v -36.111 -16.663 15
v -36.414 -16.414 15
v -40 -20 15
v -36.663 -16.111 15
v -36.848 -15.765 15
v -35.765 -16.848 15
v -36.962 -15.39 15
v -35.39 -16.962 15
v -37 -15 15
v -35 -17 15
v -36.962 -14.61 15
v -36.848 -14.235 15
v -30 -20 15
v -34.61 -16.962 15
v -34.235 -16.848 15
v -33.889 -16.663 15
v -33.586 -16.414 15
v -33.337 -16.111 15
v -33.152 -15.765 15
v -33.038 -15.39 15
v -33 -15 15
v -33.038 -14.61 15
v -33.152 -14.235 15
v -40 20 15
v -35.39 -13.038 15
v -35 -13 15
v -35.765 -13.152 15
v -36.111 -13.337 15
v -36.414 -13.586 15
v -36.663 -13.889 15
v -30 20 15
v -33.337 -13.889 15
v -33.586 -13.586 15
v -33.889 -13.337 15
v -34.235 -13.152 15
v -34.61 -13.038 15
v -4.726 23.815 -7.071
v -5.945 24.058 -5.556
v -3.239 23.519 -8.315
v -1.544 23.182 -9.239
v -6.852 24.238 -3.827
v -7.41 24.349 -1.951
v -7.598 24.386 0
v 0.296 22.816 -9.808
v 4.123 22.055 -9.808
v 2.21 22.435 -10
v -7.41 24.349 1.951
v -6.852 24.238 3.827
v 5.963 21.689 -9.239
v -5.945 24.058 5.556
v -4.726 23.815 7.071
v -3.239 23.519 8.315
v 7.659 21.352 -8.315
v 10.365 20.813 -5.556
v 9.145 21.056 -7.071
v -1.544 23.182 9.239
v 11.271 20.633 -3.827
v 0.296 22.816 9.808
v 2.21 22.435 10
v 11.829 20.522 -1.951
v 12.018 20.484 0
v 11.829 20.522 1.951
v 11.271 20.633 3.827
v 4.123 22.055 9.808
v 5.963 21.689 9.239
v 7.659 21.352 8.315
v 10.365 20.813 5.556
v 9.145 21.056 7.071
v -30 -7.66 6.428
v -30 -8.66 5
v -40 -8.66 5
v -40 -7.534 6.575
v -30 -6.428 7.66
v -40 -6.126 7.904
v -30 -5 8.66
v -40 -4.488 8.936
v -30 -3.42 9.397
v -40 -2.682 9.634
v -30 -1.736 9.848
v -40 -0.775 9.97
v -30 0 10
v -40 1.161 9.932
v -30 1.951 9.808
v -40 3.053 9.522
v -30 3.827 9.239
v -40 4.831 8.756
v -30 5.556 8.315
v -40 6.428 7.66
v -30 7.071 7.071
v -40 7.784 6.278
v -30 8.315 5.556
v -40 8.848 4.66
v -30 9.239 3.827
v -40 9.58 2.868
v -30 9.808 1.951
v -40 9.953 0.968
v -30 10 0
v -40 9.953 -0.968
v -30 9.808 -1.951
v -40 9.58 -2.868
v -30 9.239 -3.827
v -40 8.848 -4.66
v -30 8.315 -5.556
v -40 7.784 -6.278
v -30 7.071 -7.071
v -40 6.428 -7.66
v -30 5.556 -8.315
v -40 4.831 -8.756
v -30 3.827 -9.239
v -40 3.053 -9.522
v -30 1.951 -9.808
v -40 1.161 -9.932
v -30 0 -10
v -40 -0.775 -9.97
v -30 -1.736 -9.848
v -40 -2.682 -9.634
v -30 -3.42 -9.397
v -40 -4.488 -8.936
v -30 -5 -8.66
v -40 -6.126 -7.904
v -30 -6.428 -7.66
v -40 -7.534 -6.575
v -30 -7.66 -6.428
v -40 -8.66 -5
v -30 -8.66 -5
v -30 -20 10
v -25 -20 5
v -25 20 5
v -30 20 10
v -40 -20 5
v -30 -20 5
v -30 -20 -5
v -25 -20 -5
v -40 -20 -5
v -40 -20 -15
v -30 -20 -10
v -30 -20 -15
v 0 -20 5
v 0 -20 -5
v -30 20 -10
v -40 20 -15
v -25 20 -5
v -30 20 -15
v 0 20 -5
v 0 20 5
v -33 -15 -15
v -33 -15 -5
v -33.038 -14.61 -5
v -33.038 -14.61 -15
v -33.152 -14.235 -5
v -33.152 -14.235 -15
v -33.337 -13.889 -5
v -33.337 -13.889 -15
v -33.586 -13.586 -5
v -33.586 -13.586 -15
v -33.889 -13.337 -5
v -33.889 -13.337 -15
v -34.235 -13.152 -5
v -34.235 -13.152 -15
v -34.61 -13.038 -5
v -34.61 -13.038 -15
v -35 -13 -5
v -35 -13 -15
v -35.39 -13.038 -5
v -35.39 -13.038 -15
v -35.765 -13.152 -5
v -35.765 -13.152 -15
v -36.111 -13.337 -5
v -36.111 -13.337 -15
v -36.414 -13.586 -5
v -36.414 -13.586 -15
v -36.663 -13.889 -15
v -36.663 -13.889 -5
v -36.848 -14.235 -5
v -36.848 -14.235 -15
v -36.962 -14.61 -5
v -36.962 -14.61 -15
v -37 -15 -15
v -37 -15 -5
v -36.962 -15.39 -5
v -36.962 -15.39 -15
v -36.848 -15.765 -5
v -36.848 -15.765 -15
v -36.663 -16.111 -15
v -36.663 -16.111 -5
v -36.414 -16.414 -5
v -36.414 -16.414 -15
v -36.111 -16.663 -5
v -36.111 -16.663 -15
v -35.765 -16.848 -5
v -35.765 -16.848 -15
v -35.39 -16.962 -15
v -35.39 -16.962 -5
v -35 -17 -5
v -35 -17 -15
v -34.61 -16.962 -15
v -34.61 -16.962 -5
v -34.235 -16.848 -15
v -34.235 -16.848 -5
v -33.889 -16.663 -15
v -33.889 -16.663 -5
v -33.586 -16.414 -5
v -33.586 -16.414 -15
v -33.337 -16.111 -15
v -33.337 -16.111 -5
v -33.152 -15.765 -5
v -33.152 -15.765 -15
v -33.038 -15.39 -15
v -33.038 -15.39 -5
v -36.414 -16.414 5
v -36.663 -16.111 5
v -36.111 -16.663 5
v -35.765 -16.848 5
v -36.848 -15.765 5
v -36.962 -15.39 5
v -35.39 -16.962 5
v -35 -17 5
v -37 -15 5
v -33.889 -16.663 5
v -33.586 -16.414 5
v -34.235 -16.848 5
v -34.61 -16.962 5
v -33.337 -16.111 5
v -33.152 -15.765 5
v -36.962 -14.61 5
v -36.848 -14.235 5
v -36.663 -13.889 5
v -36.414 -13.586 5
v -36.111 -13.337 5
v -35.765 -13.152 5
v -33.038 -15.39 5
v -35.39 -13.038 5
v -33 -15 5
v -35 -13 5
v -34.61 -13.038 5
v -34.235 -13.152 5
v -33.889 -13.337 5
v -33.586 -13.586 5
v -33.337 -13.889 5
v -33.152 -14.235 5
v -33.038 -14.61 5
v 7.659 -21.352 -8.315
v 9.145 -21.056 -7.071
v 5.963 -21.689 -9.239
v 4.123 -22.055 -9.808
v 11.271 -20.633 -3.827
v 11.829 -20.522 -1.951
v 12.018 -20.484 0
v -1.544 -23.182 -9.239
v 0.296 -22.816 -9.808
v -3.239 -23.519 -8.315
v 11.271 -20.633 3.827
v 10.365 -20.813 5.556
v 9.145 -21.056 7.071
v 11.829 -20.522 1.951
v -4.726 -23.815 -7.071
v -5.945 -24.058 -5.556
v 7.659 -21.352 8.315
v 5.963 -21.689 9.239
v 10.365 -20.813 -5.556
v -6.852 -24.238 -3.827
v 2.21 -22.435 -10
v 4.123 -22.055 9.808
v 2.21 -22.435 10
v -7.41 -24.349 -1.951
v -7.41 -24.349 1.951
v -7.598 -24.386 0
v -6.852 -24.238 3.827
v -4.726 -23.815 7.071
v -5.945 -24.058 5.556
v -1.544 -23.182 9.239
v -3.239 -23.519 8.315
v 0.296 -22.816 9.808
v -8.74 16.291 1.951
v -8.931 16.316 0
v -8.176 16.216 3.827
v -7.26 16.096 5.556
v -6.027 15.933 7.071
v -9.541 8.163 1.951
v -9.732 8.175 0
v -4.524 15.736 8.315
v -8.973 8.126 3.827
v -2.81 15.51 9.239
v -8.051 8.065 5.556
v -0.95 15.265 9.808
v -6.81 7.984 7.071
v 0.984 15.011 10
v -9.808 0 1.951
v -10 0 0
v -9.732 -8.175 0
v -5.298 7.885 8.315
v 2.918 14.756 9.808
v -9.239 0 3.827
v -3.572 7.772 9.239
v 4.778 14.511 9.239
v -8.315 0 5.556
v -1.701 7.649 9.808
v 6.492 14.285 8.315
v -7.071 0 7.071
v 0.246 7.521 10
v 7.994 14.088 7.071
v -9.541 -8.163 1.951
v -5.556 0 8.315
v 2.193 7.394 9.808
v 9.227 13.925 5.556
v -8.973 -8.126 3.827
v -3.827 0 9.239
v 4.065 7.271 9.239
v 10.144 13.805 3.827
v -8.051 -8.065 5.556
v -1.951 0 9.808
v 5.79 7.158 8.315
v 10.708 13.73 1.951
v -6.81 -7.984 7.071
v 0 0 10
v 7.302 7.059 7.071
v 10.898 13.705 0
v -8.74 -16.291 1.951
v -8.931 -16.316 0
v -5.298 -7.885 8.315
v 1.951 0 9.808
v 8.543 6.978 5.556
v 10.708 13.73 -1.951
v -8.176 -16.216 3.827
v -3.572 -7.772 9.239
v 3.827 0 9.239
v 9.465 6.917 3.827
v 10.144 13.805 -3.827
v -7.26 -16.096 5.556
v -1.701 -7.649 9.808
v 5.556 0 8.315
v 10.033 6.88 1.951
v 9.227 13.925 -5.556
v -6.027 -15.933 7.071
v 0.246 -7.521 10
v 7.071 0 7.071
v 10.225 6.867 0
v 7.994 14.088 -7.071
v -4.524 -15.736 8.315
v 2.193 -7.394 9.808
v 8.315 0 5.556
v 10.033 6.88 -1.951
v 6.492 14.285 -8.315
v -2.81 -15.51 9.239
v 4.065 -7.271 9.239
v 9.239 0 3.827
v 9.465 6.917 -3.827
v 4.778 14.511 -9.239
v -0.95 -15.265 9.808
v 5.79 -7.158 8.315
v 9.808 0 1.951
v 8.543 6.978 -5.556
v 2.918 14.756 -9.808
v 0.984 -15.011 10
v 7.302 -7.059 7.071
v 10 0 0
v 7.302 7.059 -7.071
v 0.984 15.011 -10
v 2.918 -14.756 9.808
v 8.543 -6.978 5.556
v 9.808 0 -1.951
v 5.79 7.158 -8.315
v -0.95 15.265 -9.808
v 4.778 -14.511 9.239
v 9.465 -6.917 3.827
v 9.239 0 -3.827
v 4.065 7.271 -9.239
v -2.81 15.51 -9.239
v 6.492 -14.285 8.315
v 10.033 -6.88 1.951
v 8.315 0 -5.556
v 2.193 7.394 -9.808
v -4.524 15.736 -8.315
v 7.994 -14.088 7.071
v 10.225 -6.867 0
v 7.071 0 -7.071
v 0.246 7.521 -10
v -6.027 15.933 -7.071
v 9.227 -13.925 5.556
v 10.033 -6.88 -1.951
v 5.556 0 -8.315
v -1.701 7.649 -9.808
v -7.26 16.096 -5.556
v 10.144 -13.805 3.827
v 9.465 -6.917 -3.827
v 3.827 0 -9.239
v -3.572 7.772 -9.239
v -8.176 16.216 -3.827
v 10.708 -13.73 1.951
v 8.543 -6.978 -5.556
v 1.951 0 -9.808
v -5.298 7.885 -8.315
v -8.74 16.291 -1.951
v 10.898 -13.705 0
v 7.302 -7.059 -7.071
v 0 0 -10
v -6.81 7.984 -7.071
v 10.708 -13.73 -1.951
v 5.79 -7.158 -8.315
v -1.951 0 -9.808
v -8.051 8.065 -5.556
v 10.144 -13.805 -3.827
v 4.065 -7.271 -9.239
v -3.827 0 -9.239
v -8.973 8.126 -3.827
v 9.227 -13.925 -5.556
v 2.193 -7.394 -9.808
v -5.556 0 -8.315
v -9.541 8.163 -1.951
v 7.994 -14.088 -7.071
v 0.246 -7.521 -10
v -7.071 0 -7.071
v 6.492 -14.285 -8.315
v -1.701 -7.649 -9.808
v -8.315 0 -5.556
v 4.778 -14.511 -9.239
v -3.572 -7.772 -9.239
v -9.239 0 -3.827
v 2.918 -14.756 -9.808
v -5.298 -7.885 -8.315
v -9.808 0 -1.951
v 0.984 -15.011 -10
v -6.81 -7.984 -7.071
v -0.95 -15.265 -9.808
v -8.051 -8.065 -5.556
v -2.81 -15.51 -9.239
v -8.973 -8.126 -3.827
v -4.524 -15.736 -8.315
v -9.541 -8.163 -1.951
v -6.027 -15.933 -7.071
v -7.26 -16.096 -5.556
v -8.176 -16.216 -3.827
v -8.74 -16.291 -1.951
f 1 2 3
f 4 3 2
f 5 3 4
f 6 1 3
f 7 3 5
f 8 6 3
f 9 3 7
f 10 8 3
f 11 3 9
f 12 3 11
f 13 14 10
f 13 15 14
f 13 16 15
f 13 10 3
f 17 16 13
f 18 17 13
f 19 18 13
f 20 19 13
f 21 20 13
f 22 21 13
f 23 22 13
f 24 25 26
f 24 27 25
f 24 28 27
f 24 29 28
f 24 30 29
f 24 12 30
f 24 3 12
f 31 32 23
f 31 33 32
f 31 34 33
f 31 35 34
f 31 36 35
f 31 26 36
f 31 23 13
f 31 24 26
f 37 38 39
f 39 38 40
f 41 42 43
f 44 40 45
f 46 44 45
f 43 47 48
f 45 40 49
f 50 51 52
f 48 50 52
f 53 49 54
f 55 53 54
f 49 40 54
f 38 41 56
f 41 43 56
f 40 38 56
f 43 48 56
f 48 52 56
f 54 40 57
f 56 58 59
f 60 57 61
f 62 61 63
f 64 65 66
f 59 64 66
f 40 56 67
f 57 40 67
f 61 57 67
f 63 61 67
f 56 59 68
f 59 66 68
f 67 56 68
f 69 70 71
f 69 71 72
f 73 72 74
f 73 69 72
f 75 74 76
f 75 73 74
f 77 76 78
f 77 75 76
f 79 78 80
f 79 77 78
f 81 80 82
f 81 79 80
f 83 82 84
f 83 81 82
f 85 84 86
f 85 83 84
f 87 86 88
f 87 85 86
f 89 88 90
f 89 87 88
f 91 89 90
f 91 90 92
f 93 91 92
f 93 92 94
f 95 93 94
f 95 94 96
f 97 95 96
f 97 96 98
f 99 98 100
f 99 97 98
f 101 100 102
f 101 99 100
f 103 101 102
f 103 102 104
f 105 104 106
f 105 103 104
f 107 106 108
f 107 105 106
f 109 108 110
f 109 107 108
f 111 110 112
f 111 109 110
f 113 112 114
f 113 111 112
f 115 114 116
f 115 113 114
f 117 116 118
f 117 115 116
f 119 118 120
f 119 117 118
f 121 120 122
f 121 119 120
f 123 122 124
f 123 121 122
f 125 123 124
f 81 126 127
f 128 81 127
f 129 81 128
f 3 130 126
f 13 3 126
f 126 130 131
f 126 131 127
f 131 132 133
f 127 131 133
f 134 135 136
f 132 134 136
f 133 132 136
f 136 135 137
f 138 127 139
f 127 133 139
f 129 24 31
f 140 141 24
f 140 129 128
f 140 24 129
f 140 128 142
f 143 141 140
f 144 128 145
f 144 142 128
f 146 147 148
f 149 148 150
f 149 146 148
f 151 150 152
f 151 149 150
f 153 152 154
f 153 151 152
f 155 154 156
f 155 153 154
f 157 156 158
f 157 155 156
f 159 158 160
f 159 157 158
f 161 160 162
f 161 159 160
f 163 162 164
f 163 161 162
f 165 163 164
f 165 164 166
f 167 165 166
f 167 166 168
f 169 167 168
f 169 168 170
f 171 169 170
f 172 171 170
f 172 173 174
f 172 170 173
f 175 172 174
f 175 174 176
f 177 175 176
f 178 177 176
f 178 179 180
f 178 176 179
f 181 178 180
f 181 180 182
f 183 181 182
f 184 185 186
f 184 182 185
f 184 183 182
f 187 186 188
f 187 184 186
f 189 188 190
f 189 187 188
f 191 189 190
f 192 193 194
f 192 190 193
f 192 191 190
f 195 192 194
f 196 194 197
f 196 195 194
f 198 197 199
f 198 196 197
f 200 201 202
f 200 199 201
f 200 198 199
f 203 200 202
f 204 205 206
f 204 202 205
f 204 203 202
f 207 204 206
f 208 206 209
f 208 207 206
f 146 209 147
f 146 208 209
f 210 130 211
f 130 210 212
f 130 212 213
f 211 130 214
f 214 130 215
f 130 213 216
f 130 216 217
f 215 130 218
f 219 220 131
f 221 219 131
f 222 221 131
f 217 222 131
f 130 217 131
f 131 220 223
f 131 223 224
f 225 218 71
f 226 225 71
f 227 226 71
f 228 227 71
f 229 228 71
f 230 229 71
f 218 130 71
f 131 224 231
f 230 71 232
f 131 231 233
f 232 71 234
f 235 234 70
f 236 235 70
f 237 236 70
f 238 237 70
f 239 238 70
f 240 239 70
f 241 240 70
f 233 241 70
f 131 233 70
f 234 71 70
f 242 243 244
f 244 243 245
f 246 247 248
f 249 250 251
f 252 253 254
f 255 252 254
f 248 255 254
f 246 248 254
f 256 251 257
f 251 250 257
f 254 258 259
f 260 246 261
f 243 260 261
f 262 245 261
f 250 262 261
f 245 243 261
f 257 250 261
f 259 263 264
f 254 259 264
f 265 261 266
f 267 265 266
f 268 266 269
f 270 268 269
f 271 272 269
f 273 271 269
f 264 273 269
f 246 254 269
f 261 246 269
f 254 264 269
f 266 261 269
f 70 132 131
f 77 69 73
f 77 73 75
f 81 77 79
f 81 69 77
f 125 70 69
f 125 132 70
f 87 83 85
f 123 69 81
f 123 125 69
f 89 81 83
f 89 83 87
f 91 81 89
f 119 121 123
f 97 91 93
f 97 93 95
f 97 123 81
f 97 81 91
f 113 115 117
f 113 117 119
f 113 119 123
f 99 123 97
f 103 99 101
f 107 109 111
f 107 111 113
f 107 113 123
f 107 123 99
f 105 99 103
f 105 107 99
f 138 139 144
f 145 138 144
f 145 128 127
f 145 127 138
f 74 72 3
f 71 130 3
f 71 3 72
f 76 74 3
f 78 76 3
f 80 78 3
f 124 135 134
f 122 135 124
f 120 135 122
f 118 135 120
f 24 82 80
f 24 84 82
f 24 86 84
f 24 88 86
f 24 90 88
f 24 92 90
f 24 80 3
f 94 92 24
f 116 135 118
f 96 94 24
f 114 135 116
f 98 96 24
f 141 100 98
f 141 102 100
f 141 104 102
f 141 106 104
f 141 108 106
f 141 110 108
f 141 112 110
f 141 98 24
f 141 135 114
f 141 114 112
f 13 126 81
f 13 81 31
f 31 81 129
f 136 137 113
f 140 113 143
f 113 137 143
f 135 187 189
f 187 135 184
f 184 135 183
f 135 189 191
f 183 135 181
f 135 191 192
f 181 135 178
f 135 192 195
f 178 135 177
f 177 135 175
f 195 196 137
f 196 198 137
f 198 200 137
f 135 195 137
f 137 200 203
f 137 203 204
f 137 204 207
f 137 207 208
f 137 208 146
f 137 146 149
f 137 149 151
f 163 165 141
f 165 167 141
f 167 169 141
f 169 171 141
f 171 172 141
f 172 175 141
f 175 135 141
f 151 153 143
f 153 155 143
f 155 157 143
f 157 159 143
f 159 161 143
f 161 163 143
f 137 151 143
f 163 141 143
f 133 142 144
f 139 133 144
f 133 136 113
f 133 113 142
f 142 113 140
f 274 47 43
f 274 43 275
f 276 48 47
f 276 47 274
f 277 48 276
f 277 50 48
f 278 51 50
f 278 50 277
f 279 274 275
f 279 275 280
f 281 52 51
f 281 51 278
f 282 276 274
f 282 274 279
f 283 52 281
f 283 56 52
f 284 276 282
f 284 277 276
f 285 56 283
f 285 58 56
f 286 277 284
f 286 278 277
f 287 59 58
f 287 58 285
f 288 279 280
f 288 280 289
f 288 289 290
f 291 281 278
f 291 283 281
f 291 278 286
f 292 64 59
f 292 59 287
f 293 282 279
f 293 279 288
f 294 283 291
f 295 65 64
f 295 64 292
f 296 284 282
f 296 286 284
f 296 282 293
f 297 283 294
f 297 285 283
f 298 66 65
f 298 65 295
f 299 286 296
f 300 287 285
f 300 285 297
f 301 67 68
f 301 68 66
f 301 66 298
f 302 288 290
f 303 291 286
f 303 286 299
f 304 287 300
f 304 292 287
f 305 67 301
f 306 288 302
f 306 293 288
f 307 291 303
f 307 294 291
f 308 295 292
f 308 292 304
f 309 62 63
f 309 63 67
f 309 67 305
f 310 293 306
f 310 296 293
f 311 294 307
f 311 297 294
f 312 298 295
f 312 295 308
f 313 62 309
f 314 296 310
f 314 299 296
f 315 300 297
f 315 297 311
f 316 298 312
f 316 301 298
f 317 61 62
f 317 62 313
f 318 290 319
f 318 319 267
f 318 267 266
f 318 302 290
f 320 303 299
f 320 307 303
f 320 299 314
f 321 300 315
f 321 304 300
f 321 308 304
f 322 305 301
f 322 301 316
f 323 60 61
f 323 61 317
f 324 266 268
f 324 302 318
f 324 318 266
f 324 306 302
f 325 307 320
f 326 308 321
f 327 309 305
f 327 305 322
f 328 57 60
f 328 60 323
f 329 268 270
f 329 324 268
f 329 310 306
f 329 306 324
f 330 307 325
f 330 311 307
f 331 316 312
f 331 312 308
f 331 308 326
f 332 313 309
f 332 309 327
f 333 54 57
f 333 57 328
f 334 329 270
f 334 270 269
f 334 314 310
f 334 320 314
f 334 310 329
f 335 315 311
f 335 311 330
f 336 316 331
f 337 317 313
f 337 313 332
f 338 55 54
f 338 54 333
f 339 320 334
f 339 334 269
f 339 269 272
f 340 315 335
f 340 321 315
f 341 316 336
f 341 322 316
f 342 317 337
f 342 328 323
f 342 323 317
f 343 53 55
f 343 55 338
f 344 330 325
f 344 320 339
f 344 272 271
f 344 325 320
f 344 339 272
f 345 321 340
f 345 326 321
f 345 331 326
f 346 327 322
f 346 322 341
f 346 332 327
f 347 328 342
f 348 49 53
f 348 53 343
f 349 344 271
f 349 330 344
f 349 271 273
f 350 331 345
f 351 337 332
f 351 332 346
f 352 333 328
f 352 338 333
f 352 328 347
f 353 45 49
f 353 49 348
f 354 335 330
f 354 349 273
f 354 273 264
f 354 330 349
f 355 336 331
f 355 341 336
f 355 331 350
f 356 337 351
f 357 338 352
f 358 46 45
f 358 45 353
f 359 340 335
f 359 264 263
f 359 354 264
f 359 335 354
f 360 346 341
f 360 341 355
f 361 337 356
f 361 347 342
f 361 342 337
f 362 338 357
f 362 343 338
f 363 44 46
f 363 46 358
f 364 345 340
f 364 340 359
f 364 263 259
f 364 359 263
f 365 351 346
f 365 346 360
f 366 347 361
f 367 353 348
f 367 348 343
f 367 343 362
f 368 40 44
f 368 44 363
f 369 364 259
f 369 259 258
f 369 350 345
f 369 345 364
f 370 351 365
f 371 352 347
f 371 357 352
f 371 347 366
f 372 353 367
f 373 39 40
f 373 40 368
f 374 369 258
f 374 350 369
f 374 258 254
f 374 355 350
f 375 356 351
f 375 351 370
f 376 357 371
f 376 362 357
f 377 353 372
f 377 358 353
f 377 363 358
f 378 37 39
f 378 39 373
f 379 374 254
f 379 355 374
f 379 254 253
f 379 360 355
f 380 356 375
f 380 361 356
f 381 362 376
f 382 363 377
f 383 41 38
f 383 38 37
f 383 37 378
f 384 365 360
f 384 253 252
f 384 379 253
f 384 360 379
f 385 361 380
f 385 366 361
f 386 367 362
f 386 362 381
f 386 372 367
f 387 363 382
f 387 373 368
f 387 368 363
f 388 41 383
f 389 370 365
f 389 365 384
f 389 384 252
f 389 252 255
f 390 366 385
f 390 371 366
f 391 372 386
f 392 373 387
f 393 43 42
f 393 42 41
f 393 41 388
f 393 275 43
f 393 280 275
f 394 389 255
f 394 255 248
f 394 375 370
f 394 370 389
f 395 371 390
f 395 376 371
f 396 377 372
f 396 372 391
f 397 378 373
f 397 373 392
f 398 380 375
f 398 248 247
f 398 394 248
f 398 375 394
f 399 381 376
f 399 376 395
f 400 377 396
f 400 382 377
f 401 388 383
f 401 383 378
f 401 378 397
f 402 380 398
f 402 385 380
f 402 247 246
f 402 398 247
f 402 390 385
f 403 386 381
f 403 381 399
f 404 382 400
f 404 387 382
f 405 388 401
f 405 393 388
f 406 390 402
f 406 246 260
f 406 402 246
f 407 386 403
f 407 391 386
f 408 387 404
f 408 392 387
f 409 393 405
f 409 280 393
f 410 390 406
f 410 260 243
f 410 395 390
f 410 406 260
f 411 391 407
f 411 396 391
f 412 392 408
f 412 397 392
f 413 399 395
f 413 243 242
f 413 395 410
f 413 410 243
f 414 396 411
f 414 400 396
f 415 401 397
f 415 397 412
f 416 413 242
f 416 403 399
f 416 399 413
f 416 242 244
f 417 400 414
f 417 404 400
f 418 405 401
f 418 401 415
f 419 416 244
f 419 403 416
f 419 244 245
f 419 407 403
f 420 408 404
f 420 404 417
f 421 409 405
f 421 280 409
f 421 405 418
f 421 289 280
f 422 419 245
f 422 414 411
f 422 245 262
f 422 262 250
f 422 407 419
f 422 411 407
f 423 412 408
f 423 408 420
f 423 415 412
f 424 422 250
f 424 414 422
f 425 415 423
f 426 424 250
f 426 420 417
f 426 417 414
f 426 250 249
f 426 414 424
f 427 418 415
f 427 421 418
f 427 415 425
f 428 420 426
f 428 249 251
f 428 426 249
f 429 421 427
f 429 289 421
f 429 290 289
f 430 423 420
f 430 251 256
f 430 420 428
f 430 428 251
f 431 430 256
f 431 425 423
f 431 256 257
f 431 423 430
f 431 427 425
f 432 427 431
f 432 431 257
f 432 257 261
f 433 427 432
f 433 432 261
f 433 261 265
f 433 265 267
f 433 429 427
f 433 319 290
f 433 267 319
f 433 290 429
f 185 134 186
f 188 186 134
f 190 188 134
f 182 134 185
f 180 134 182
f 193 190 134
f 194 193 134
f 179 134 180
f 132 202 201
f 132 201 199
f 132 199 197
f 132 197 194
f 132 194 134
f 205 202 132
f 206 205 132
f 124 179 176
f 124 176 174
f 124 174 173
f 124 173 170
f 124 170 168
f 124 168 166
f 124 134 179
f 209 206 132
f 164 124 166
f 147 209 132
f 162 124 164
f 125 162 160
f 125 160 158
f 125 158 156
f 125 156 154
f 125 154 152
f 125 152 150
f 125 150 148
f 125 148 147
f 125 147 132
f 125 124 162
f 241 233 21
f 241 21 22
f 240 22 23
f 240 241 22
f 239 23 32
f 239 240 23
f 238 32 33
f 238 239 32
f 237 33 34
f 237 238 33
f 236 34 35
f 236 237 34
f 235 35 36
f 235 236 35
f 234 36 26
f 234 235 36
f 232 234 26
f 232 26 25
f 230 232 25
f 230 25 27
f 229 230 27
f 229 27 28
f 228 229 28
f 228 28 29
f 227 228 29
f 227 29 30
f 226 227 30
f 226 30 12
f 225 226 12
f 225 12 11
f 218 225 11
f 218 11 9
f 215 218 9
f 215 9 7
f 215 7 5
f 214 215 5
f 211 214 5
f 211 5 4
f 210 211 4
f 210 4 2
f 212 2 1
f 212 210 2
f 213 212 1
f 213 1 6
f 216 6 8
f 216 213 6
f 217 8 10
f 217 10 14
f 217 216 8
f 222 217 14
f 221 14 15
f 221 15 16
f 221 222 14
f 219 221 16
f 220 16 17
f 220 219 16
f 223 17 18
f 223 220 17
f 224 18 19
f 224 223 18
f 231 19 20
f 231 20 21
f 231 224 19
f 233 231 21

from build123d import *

# Parameters (mm, degrees)
PAD_DEPTH            = 15
PAD_DEPTH_BACK       = 15
TORUS_R              = 10
CYLINDER001_R        = 2
CYLINDER001_DEPTH    = 30
BOX002_W             = 10
BOX002_H             = 12
BOX002_DEPTH         = 10
CYLINDER_R           = 10
CYLINDER_DEPTH       = 10
CYLINDER_PITCH_ANGLE = -90
BOX_W                = 10
BOX_H                = 40
BOX_DEPTH            = 30
BOX003_W             = 10
BOX003_H             = 40
BOX003_DEPTH         = 20
CHAMFER_SIZE         = 5
BOX001_W             = 30
BOX001_H             = 40
BOX001_DEPTH         = 10


with BuildPart() as body:
    # Sketch → Pad (new body, two sides)
    with BuildSketch(Plane.XY) as pad_sk:
        Polygon((-20, 26.85317), (115, 0), (-20, -26.85317), align=None)
    extrude(amount=PAD_DEPTH)
    extrude(pad_sk.sketch, amount=-PAD_DEPTH_BACK)


with BuildPart() as rail_common:
    # Torus → Torus (revolve)
    with BuildSketch(Plane(origin=(115, 0, 0), x_dir=(1, 0, 0), z_dir=(0, -1, 0))):
        with Locations((115, 0)):
            Circle(TORUS_R)
    revolve(axis=Axis((115, 0, 0), (0, 0, 1)))

    # Common: intersect Body
    add(body.part, mode=Mode.INTERSECT)


with BuildPart() as cylinder001:
    # Cylinder001 → Cylinder001 (new body)
    with BuildSketch(Plane(origin=(-35, -15, -15), x_dir=(1, 0, 0), z_dir=(0, 0, 1))):
        Circle(CYLINDER001_R)
    extrude(amount=CYLINDER001_DEPTH)


with BuildPart() as cube002:
    # Box002 → Box002 (new body)
    with BuildSketch(Plane(origin=(-40, -20, -5), x_dir=(1, 0, 0), z_dir=(0, 0, 1))):
        with Locations((5, 6)):
            Rectangle(BOX002_W, BOX002_H)
    extrude(amount=BOX002_DEPTH)


with BuildPart() as negative_fusion:
    # Cylinder → Cylinder (new body)
    with BuildSketch(Plane.XY):
        Circle(CYLINDER_R)
    extrude(amount=CYLINDER_DEPTH)


with BuildPart() as negative_fusion_1:
    # Cylinder pitch: moved
    add(negative_fusion.part.rotate(Axis((0, 0, 0), (0, 1, 0)), CYLINDER_PITCH_ANGLE))


with BuildPart() as negative_fusion_2:
    # Cylinder placement: moved
    add(negative_fusion_1.part.moved(Location((-30, 0, 0))))

    # Fusion001: union Cylinder001, Cube002
    add(cylinder001.part)
    add(cube002.part)


with BuildPart() as cube:
    # Box → Box (new body)
    with BuildSketch(Plane(origin=(-40, -20, -15), x_dir=(1, 0, 0), z_dir=(0, 0, 1))):
        with Locations((5, 20)):
            Rectangle(BOX_W, BOX_H)
    extrude(amount=BOX_DEPTH)


with BuildPart() as chamfer_body:
    # Box003 → Box003 (new body)
    with BuildSketch(Plane(origin=(-35, -20, -10), x_dir=(1, 0, 0), z_dir=(0, 0, 1))):
        with Locations((5, 20)):
            Rectangle(BOX003_W, BOX003_H)
    extrude(amount=BOX003_DEPTH)

    # Chamfer
    chamfer_edges = [chamfer_body.edges().sort_by_distance(p)[0] for p in [
        (-25, 0, 10),
        (-25, 0, -10),
    ]]
    chamfer(chamfer_edges, length=CHAMFER_SIZE)


with BuildPart() as cut:
    # Box001 → Box001 (new body)
    with BuildSketch(Plane(origin=(-30, -20, -5), x_dir=(1, 0, 0), z_dir=(0, 0, 1))):
        with Locations((15, 20)):
            Rectangle(BOX001_W, BOX001_H)
    extrude(amount=BOX001_DEPTH)

    # Fusion: union Cube, Chamfer body
    add(cube.part)
    add(chamfer_body.part)

    # Cut: cut Negative Fusion
    add(negative_fusion_2.part, mode=Mode.SUBTRACT)


solid = Compound([rail_common.part, cut.part])
